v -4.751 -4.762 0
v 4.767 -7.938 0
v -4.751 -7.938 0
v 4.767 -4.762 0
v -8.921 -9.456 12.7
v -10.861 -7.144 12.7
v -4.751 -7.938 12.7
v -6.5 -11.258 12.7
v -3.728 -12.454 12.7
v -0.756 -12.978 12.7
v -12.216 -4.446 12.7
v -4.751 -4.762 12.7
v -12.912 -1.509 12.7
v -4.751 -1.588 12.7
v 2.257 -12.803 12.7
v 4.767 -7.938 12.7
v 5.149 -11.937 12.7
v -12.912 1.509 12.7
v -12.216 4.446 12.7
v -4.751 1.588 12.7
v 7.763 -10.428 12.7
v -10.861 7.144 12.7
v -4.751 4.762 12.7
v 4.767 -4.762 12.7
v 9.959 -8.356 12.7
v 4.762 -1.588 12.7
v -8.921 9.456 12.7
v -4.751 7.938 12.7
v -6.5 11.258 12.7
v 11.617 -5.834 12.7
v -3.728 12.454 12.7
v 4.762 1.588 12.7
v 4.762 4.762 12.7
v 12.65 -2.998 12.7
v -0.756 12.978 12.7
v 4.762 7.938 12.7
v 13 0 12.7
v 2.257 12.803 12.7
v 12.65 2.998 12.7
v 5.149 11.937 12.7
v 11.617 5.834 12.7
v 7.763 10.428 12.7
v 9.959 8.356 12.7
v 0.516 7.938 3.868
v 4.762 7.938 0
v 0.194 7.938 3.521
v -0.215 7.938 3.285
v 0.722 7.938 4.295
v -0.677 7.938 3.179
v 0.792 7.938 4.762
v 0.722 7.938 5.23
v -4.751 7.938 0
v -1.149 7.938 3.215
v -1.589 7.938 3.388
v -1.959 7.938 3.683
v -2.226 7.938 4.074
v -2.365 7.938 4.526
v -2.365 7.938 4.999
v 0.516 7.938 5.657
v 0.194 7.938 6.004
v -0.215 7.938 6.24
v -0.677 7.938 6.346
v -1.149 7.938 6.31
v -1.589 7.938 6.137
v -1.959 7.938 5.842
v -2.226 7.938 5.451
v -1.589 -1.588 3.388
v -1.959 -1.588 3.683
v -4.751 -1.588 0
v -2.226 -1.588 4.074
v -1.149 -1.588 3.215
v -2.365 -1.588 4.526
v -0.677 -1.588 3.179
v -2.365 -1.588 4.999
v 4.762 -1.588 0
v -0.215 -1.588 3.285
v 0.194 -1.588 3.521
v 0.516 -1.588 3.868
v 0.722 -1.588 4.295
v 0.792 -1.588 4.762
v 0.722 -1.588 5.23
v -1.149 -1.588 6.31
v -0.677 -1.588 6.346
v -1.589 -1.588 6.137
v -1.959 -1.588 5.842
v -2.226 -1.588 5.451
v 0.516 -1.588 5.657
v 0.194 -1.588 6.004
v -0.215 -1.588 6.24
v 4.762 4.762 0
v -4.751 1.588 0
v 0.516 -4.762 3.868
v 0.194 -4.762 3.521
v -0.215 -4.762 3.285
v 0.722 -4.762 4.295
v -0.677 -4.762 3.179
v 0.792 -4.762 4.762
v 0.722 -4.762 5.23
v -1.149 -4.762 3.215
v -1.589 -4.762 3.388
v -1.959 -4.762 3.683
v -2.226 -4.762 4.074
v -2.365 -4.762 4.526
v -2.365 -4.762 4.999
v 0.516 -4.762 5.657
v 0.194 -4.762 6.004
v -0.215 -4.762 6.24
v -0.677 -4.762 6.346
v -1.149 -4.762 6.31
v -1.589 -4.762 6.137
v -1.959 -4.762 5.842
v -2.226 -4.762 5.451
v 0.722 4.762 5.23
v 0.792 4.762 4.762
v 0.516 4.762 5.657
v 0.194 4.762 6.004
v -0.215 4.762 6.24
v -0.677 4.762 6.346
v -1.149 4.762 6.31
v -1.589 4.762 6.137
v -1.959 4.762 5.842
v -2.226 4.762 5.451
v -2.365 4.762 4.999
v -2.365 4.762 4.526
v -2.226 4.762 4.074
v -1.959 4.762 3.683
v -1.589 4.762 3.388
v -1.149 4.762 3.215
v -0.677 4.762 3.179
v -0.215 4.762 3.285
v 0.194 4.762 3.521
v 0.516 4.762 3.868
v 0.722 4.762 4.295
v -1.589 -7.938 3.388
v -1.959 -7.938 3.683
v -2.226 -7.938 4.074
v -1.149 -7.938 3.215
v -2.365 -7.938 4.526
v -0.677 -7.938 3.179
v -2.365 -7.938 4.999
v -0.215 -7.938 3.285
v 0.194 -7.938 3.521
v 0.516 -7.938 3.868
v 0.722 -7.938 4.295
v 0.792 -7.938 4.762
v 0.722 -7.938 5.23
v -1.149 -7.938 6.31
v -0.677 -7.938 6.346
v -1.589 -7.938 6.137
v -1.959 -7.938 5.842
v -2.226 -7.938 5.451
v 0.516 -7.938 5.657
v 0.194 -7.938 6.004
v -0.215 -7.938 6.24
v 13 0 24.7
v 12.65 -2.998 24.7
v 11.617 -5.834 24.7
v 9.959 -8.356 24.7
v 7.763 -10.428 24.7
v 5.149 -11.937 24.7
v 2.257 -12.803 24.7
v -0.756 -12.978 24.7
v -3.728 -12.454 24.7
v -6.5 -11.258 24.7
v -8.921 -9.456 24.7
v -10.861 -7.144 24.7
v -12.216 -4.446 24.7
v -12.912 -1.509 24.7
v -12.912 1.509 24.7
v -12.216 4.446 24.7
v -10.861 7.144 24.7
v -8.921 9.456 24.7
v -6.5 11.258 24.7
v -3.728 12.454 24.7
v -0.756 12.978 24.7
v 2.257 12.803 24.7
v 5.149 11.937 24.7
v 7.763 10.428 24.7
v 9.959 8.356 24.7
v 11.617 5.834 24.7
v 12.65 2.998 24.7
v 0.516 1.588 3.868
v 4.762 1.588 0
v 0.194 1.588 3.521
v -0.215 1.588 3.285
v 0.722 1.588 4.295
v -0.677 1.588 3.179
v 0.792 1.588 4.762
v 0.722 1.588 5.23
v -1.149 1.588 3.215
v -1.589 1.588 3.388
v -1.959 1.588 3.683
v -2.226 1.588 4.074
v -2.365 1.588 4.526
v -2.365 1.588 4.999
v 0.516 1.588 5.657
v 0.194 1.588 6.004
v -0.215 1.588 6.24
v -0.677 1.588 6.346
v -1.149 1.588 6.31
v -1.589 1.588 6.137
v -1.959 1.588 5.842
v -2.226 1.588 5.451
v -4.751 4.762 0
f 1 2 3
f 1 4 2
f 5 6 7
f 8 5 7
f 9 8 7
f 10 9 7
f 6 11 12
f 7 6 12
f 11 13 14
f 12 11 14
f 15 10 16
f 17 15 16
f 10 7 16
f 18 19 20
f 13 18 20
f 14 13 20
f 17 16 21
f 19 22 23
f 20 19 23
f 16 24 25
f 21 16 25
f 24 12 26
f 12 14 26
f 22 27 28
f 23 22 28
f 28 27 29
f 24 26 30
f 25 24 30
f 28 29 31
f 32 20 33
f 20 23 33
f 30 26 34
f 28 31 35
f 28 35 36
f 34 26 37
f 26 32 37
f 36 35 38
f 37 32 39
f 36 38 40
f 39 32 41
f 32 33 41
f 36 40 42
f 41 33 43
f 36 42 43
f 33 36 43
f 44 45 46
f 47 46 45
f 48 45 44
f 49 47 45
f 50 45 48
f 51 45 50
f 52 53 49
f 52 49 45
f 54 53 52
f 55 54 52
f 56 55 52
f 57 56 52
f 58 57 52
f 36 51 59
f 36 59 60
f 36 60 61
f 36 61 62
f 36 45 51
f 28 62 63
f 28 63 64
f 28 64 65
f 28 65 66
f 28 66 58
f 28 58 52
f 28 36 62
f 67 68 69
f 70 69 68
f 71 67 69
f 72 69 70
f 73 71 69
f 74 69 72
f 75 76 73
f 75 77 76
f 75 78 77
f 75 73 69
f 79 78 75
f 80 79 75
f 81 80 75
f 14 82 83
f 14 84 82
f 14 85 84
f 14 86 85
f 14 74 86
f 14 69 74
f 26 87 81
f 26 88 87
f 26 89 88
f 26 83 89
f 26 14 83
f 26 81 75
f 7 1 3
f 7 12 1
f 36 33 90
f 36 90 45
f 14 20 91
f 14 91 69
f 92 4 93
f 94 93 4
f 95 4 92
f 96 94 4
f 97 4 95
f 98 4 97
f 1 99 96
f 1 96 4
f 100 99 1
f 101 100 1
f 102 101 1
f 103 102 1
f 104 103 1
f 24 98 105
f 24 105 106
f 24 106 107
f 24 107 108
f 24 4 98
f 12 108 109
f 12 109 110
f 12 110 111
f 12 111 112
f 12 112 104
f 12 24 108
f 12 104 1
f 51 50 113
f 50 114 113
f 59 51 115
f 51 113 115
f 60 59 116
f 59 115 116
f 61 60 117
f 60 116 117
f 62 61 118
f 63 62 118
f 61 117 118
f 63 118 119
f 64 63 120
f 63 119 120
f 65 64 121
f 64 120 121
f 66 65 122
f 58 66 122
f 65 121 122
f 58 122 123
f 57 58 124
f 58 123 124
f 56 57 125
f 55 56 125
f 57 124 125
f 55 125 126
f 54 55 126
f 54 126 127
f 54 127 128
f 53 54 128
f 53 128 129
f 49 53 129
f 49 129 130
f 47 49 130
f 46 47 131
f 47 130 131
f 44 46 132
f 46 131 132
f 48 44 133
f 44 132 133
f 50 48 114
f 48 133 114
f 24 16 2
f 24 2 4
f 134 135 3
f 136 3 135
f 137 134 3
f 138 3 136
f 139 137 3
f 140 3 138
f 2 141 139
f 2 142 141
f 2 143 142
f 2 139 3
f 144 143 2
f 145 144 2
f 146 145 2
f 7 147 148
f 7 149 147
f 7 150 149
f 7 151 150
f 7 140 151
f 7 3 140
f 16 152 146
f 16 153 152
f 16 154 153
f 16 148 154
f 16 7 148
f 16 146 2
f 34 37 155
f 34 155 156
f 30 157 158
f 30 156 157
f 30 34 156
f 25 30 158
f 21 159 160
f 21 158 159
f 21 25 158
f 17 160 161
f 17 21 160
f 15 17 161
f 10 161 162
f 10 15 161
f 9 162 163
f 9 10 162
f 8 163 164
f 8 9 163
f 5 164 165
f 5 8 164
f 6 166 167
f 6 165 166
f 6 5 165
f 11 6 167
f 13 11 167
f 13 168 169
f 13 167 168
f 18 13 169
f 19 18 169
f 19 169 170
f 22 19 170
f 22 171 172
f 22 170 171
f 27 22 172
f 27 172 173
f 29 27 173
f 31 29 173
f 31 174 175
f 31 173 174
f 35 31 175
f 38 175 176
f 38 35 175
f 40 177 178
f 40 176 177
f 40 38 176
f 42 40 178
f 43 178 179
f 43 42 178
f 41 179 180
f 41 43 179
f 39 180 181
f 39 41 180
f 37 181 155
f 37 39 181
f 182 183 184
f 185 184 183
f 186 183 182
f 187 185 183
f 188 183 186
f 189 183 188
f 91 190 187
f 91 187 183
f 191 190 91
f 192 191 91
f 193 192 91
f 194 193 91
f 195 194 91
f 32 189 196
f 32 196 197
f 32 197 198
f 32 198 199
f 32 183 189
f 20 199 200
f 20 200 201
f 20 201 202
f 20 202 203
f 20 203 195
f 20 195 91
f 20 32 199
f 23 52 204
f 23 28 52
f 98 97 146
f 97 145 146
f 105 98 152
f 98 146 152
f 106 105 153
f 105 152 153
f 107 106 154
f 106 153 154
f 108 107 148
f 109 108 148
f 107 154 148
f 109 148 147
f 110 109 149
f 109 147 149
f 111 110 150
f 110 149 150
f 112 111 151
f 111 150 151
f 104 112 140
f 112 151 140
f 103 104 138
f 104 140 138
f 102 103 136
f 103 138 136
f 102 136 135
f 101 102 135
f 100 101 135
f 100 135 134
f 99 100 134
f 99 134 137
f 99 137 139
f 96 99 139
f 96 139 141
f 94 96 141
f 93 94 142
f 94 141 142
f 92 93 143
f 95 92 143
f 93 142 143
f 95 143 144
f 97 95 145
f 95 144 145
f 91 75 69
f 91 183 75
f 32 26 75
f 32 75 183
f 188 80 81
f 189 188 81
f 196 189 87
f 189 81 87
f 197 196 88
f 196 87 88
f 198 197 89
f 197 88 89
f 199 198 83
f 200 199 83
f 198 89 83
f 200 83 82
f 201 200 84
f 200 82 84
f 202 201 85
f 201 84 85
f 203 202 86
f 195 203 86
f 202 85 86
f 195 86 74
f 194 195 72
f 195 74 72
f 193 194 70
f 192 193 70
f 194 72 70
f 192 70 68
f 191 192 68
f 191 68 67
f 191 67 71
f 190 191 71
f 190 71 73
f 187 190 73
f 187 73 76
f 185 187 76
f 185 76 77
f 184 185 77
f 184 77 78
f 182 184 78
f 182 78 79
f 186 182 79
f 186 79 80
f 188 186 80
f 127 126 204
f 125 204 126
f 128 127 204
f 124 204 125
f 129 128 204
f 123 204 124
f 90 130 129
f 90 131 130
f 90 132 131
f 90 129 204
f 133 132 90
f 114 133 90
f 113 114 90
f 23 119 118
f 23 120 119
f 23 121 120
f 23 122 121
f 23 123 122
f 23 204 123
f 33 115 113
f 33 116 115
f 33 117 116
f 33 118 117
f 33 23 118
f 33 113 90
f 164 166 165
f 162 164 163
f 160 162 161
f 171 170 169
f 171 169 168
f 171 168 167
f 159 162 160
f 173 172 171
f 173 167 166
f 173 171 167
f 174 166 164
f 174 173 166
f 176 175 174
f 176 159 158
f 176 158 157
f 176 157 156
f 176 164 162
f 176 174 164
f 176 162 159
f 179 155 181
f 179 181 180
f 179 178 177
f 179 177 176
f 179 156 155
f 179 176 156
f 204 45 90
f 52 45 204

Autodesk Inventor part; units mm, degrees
ref_plane "YZ Plane" through (0, 0, 0) normal (1, 0, 0) x (0, 1, 0)
ref_plane "XZ Plane" through (0, 0, 0) normal (0, 1, 0) x (-1, 0, 0)
ref_plane "XY Plane" through (0, 0, 0) normal (0, 0, 1) x (1, 0, 0)
ref_plane "Work Plane2" through (30.8055, -26.6615, 12.7) normal (0, 0, 1) x (1, 0, 0)
sketch "Sketch2" plane through (30.8055, -26.6615, 12.7) normal (0, 0, 1) x (1, 0, 0)
  circle A0 centre (-30.8055, 26.6615) radius 13
  dimension "d0" = 26
extrude "Extrusion1" add sketch "Sketch2" along normal blind 12
sketch "Sketch5" plane through (0, 0, 12.7) normal (0, 0, -1) x (-1, 0, 0)
  line L0 (-4.7625, 7.9375) -> (4.7509, 7.9375)
  line L1 (4.7509, 7.9375) -> (4.7509, 4.7625)
  line L2 (4.7509, 4.7625) -> (-4.7625, 4.7625)
  line L3 (-4.7625, 4.7625) -> (-4.7625, 7.9375)
  line L4 (-4.7625, 1.5875) -> (4.7509, 1.5875)
  line L5 (4.7509, 1.5875) -> (4.7509, -1.5875)
  line L6 (4.7509, -1.5875) -> (-4.7625, -1.5875)
  line L7 (-4.7625, -1.5875) -> (-4.7625, 1.5875)
  line L8 (-4.7672, -4.7625) -> (4.7509, -4.7625)
  line L9 (4.7509, -4.7625) -> (4.7509, -7.9375)
  line L10 (4.7509, -7.9375) -> (-4.7672, -7.9375)
  line L11 (-4.7672, -7.9375) -> (-4.7672, -4.7625)
  point P0 (0, 0)
extrude "Extrusion4" add sketch "Sketch5" along normal blind 12.7
sketch "Sketch8" plane through (-4.7509, -7.9375, 12.7) normal (0, -1, 0) x (1, 0, 0)
  circle A0 centre (3.9555, -7.9375) radius 1.5875
  line L0 (9.5181, 0) -> (9.5181, -12.7) projected
  point P0 (4.7509, -12.7)
  dimension "d17" = 5.5626
extrude "Extrusion7" cut sketch "Sketch8" against normal blind 25.4
properties part number "Swing_Joint"
